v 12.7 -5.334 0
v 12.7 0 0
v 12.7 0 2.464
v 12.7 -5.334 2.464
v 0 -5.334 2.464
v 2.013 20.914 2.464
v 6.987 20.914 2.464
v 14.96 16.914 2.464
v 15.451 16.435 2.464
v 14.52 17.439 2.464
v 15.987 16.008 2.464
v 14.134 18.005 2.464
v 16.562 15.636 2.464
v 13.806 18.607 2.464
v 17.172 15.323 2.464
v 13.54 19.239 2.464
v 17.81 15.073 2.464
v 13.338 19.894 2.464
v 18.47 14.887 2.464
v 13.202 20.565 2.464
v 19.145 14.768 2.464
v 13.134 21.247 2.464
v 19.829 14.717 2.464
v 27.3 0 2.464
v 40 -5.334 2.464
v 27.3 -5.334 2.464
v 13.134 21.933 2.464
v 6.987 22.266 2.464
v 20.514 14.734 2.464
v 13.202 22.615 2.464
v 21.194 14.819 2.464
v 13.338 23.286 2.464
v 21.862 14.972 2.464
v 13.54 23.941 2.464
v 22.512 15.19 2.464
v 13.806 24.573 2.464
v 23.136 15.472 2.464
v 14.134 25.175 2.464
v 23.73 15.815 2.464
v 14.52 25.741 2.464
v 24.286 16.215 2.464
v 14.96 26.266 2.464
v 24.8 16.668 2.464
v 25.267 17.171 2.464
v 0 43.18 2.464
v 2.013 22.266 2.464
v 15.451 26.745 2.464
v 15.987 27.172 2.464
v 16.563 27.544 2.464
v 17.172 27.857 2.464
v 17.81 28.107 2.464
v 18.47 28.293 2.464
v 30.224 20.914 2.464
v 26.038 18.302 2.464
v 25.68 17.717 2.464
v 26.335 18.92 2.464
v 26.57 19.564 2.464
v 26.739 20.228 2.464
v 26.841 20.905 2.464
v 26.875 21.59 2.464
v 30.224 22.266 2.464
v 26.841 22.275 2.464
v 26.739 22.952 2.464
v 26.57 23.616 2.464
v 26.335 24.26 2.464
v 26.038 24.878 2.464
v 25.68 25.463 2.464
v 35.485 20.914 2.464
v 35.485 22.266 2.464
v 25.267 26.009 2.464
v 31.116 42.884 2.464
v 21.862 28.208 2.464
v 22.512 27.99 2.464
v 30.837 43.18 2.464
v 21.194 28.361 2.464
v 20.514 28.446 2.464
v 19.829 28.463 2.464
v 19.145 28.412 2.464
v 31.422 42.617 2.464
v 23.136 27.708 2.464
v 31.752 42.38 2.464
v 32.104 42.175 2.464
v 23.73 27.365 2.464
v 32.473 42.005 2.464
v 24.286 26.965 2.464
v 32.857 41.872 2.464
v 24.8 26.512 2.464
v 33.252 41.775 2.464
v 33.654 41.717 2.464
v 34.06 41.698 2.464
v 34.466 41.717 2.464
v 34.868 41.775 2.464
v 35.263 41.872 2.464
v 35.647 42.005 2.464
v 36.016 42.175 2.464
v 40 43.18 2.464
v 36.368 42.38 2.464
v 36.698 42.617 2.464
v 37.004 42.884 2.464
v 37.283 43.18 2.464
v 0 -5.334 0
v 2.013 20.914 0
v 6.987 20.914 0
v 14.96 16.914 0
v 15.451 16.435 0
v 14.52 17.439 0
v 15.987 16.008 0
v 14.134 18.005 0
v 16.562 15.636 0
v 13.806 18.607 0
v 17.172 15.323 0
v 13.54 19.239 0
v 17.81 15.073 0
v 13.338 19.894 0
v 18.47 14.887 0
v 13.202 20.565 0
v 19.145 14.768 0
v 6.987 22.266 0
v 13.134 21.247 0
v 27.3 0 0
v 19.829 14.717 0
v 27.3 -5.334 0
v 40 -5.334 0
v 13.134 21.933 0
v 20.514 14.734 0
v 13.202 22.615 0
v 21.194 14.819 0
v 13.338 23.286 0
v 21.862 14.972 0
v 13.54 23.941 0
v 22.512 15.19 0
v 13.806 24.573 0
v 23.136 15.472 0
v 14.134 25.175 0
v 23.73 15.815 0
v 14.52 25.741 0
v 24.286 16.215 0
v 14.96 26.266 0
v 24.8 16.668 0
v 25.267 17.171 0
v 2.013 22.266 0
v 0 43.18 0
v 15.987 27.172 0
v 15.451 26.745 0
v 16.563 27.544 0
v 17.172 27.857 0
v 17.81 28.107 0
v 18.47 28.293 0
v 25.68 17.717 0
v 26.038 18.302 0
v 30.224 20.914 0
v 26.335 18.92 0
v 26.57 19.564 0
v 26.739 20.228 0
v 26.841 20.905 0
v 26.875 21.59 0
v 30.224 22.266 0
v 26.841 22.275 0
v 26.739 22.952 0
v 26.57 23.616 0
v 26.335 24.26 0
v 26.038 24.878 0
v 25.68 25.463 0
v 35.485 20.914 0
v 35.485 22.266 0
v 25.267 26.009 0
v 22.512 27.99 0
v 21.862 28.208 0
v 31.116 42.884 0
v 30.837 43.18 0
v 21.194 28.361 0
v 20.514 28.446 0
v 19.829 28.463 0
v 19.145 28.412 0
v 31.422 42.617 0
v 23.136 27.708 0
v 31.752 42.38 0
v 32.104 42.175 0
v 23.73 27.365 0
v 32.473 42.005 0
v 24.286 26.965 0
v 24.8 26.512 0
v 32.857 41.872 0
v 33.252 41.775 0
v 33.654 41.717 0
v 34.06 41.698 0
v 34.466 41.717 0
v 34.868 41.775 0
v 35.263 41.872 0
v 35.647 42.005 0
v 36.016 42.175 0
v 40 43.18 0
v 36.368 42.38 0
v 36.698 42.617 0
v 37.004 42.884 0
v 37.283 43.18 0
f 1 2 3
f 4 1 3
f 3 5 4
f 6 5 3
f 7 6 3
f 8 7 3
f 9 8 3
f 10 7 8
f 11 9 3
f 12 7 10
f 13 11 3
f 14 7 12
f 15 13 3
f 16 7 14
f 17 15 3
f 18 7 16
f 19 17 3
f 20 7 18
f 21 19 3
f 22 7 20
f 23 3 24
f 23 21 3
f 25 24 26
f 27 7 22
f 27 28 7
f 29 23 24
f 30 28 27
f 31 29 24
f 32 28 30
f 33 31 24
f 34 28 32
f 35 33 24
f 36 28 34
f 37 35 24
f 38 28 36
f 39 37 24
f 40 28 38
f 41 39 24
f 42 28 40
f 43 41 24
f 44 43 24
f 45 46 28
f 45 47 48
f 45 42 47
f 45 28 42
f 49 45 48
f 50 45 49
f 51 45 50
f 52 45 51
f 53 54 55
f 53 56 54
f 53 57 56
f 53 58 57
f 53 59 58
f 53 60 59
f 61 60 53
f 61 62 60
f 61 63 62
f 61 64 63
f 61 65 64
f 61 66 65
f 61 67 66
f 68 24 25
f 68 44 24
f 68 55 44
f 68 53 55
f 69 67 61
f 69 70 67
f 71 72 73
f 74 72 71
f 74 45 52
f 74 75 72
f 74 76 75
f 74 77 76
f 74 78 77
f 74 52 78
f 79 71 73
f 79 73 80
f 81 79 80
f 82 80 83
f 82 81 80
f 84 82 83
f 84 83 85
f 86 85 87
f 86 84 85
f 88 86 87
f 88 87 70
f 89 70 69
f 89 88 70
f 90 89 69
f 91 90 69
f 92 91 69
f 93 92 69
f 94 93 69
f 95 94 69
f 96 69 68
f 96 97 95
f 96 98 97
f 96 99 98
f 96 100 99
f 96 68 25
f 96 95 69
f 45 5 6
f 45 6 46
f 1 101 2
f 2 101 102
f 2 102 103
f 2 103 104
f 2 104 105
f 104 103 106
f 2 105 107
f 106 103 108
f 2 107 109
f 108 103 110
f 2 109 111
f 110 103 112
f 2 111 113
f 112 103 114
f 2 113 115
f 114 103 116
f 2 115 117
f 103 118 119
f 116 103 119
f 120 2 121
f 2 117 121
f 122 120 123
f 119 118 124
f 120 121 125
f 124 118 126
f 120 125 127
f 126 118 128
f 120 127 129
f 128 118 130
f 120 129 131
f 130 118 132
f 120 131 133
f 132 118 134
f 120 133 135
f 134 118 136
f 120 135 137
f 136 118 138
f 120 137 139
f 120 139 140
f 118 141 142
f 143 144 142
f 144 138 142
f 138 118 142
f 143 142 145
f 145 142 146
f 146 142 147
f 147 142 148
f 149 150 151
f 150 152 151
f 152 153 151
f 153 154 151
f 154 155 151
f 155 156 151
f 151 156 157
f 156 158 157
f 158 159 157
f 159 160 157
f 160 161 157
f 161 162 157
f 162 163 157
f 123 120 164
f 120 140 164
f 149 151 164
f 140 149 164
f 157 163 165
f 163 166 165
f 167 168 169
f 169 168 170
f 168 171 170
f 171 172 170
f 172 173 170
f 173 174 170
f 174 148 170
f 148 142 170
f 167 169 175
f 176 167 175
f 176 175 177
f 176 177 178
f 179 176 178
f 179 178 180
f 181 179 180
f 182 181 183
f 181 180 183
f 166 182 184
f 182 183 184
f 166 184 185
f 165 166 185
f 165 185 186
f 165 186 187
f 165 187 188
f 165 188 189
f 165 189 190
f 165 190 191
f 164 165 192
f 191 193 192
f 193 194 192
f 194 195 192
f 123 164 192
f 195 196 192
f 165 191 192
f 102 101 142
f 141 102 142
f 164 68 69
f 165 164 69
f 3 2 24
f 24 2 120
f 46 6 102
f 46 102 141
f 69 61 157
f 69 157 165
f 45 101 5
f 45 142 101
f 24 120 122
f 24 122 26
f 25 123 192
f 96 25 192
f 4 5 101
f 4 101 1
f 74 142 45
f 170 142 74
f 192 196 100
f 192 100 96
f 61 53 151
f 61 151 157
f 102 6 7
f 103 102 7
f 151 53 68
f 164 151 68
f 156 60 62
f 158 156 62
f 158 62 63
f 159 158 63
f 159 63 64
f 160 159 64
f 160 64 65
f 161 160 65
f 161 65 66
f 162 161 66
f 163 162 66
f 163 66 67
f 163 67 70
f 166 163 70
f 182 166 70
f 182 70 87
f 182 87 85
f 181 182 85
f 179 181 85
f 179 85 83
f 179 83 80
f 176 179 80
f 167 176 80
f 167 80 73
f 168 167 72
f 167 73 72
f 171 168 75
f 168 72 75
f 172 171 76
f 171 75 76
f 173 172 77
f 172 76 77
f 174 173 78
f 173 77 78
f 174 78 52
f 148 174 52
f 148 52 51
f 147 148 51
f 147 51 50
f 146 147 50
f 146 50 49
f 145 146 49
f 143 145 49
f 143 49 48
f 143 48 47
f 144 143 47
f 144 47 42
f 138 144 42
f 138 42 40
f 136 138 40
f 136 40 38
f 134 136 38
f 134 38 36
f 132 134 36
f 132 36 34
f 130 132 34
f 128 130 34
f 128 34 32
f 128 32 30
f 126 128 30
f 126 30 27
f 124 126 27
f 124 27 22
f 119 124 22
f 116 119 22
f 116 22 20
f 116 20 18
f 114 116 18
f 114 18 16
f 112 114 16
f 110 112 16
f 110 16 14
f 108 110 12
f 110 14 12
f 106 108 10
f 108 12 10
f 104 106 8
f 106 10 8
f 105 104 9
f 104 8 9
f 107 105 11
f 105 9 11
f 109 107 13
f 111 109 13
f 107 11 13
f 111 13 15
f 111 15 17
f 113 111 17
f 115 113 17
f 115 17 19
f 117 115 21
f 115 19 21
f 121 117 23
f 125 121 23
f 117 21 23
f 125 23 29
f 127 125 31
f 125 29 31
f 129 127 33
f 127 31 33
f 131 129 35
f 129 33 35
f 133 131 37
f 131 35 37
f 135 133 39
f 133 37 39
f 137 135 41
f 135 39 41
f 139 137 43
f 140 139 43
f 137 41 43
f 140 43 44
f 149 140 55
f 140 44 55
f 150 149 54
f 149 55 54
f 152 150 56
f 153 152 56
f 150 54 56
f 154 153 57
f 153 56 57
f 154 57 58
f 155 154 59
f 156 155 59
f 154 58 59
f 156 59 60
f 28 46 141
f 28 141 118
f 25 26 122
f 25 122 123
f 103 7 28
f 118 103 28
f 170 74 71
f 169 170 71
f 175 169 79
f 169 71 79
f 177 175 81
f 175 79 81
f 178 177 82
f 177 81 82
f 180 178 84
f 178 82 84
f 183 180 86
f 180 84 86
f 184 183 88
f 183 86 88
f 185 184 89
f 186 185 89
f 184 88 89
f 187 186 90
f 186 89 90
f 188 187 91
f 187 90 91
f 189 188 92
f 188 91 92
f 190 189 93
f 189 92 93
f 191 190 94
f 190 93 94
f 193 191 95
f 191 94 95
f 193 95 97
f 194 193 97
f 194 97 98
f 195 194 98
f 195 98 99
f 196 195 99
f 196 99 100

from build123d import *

# Parameters (mm, degrees)
SKETCH1_W          = 40
SKETCH1_H          = 43.18
BASE_DEPTH         = 2.4638
SKETCH2_W          = 12.7
SKETCH2_H          = 2.4638
BOTTOM_TABS_DEPTH  = 5.334
SKETCH3_R          = 6.875
SKETCH3_W          = 5.261651729
SKETCH3_H          = 1.351567934
SKETCH3_W_2        = 4.974619722
MOUNT_POINTS_DEPTH = 59.911651737
SKETCH4_R          = 4.245
CUT_EXTRUDE2_DEPTH = 36.250138525


with BuildPart() as part:
    # Sketch1 → Base (new body)
    with BuildSketch(Plane.XY):
        with Locations((20, 21.59)):
            Rectangle(SKETCH1_W, SKETCH1_H)
    extrude(amount=BASE_DEPTH)

    # Sketch2 → Bottom Tabs (add)
    with BuildSketch(Plane.XZ):
        with Locations((6.35, 1.2319)):
            Rectangle(SKETCH2_W, SKETCH2_H)
        with Locations((33.65, 1.2319)):
            Rectangle(SKETCH2_W, SKETCH2_H)
    extrude(amount=BOTTOM_TABS_DEPTH)

    # Sketch3 → Mount Points (cut, through all)
    with BuildSketch(Plane.XY.offset(2.4638)):
        with Locations((20, 21.59)):
            Circle(SKETCH3_R)
        with Locations((32.854435388, 21.59)):
            Rectangle(SKETCH3_W, SKETCH3_H)
        with Locations((4.5, 21.59)):
            Rectangle(SKETCH3_W_2, SKETCH3_H)
    extrude(amount=-MOUNT_POINTS_DEPTH, mode=Mode.SUBTRACT)

    # Sketch4 → Cut-Extrude2 (cut, through all)
    with BuildSketch(Plane(origin=(18.246403628, 22.293576812, 2.4638), x_dir=(1, 0, 0), z_dir=(0, 0, 1))):
        with Locations((15.813596372, 23.649057543)):
            Circle(SKETCH4_R)
    extrude(amount=-CUT_EXTRUDE2_DEPTH, mode=Mode.SUBTRACT)


solid = part.part
